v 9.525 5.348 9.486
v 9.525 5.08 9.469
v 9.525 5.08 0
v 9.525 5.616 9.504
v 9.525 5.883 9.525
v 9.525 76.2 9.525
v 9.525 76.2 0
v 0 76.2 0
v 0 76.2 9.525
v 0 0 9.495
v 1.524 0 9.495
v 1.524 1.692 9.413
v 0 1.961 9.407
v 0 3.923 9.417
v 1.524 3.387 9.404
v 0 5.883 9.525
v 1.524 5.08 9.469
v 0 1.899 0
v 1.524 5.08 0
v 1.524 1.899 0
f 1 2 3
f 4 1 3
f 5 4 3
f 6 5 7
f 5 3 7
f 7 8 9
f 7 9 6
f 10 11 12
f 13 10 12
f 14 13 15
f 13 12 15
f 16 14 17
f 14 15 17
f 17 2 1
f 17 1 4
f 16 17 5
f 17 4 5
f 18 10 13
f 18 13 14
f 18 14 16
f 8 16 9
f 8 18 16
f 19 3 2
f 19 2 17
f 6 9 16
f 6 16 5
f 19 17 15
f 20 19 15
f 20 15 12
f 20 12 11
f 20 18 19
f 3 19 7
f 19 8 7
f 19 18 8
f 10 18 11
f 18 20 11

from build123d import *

# Parameters (mm, degrees)
F0_W     = 9.525
F0_H     = 76.2
F1_DEPTH = 9.525
F2_W     = 8.001
F2_H     = 5.08
F3_DEPTH = 25.4
F4_R     = 39.221374
F5_DEPTH = 25.4
F7_DEPTH = 25.4


with BuildPart() as f1:
    # F0 (on Top) → F1 (new body)
    with BuildSketch(Plane.XY):
        with Locations((4.7625, 38.1)):
            Rectangle(F0_W, F0_H)
    extrude(amount=F1_DEPTH)

    # F2 (on face) → F3 (cut)
    with BuildSketch(Plane.XY.offset(9.525)):
        Polygon((1.524, 0), (1.524, -3.864633), (13.939685, -4.220638), (13.939685, 5.08), (9.525, 5.08), (9.525, 0), align=None)
        with Locations((5.5245, 2.54)):
            Rectangle(F2_W, F2_H)
    extrude(amount=-F3_DEPTH, mode=Mode.SUBTRACT)

    # F4 (on face) → F5 (cut)
    with BuildSketch(Plane.YZ.offset(9.525)):
        with Locations((2.740548, 48.620269)):
            Circle(F4_R)
    extrude(amount=-F5_DEPTH, mode=Mode.SUBTRACT)

    # F6 (on face) → F7 (cut)
    with BuildSketch(Plane.YZ.offset(9.525)):
        Polygon((2.305606, -2.034316), (0, 9.494759), (0, 0), align=None)
    extrude(amount=-F7_DEPTH, mode=Mode.SUBTRACT)


solid = f1.part
